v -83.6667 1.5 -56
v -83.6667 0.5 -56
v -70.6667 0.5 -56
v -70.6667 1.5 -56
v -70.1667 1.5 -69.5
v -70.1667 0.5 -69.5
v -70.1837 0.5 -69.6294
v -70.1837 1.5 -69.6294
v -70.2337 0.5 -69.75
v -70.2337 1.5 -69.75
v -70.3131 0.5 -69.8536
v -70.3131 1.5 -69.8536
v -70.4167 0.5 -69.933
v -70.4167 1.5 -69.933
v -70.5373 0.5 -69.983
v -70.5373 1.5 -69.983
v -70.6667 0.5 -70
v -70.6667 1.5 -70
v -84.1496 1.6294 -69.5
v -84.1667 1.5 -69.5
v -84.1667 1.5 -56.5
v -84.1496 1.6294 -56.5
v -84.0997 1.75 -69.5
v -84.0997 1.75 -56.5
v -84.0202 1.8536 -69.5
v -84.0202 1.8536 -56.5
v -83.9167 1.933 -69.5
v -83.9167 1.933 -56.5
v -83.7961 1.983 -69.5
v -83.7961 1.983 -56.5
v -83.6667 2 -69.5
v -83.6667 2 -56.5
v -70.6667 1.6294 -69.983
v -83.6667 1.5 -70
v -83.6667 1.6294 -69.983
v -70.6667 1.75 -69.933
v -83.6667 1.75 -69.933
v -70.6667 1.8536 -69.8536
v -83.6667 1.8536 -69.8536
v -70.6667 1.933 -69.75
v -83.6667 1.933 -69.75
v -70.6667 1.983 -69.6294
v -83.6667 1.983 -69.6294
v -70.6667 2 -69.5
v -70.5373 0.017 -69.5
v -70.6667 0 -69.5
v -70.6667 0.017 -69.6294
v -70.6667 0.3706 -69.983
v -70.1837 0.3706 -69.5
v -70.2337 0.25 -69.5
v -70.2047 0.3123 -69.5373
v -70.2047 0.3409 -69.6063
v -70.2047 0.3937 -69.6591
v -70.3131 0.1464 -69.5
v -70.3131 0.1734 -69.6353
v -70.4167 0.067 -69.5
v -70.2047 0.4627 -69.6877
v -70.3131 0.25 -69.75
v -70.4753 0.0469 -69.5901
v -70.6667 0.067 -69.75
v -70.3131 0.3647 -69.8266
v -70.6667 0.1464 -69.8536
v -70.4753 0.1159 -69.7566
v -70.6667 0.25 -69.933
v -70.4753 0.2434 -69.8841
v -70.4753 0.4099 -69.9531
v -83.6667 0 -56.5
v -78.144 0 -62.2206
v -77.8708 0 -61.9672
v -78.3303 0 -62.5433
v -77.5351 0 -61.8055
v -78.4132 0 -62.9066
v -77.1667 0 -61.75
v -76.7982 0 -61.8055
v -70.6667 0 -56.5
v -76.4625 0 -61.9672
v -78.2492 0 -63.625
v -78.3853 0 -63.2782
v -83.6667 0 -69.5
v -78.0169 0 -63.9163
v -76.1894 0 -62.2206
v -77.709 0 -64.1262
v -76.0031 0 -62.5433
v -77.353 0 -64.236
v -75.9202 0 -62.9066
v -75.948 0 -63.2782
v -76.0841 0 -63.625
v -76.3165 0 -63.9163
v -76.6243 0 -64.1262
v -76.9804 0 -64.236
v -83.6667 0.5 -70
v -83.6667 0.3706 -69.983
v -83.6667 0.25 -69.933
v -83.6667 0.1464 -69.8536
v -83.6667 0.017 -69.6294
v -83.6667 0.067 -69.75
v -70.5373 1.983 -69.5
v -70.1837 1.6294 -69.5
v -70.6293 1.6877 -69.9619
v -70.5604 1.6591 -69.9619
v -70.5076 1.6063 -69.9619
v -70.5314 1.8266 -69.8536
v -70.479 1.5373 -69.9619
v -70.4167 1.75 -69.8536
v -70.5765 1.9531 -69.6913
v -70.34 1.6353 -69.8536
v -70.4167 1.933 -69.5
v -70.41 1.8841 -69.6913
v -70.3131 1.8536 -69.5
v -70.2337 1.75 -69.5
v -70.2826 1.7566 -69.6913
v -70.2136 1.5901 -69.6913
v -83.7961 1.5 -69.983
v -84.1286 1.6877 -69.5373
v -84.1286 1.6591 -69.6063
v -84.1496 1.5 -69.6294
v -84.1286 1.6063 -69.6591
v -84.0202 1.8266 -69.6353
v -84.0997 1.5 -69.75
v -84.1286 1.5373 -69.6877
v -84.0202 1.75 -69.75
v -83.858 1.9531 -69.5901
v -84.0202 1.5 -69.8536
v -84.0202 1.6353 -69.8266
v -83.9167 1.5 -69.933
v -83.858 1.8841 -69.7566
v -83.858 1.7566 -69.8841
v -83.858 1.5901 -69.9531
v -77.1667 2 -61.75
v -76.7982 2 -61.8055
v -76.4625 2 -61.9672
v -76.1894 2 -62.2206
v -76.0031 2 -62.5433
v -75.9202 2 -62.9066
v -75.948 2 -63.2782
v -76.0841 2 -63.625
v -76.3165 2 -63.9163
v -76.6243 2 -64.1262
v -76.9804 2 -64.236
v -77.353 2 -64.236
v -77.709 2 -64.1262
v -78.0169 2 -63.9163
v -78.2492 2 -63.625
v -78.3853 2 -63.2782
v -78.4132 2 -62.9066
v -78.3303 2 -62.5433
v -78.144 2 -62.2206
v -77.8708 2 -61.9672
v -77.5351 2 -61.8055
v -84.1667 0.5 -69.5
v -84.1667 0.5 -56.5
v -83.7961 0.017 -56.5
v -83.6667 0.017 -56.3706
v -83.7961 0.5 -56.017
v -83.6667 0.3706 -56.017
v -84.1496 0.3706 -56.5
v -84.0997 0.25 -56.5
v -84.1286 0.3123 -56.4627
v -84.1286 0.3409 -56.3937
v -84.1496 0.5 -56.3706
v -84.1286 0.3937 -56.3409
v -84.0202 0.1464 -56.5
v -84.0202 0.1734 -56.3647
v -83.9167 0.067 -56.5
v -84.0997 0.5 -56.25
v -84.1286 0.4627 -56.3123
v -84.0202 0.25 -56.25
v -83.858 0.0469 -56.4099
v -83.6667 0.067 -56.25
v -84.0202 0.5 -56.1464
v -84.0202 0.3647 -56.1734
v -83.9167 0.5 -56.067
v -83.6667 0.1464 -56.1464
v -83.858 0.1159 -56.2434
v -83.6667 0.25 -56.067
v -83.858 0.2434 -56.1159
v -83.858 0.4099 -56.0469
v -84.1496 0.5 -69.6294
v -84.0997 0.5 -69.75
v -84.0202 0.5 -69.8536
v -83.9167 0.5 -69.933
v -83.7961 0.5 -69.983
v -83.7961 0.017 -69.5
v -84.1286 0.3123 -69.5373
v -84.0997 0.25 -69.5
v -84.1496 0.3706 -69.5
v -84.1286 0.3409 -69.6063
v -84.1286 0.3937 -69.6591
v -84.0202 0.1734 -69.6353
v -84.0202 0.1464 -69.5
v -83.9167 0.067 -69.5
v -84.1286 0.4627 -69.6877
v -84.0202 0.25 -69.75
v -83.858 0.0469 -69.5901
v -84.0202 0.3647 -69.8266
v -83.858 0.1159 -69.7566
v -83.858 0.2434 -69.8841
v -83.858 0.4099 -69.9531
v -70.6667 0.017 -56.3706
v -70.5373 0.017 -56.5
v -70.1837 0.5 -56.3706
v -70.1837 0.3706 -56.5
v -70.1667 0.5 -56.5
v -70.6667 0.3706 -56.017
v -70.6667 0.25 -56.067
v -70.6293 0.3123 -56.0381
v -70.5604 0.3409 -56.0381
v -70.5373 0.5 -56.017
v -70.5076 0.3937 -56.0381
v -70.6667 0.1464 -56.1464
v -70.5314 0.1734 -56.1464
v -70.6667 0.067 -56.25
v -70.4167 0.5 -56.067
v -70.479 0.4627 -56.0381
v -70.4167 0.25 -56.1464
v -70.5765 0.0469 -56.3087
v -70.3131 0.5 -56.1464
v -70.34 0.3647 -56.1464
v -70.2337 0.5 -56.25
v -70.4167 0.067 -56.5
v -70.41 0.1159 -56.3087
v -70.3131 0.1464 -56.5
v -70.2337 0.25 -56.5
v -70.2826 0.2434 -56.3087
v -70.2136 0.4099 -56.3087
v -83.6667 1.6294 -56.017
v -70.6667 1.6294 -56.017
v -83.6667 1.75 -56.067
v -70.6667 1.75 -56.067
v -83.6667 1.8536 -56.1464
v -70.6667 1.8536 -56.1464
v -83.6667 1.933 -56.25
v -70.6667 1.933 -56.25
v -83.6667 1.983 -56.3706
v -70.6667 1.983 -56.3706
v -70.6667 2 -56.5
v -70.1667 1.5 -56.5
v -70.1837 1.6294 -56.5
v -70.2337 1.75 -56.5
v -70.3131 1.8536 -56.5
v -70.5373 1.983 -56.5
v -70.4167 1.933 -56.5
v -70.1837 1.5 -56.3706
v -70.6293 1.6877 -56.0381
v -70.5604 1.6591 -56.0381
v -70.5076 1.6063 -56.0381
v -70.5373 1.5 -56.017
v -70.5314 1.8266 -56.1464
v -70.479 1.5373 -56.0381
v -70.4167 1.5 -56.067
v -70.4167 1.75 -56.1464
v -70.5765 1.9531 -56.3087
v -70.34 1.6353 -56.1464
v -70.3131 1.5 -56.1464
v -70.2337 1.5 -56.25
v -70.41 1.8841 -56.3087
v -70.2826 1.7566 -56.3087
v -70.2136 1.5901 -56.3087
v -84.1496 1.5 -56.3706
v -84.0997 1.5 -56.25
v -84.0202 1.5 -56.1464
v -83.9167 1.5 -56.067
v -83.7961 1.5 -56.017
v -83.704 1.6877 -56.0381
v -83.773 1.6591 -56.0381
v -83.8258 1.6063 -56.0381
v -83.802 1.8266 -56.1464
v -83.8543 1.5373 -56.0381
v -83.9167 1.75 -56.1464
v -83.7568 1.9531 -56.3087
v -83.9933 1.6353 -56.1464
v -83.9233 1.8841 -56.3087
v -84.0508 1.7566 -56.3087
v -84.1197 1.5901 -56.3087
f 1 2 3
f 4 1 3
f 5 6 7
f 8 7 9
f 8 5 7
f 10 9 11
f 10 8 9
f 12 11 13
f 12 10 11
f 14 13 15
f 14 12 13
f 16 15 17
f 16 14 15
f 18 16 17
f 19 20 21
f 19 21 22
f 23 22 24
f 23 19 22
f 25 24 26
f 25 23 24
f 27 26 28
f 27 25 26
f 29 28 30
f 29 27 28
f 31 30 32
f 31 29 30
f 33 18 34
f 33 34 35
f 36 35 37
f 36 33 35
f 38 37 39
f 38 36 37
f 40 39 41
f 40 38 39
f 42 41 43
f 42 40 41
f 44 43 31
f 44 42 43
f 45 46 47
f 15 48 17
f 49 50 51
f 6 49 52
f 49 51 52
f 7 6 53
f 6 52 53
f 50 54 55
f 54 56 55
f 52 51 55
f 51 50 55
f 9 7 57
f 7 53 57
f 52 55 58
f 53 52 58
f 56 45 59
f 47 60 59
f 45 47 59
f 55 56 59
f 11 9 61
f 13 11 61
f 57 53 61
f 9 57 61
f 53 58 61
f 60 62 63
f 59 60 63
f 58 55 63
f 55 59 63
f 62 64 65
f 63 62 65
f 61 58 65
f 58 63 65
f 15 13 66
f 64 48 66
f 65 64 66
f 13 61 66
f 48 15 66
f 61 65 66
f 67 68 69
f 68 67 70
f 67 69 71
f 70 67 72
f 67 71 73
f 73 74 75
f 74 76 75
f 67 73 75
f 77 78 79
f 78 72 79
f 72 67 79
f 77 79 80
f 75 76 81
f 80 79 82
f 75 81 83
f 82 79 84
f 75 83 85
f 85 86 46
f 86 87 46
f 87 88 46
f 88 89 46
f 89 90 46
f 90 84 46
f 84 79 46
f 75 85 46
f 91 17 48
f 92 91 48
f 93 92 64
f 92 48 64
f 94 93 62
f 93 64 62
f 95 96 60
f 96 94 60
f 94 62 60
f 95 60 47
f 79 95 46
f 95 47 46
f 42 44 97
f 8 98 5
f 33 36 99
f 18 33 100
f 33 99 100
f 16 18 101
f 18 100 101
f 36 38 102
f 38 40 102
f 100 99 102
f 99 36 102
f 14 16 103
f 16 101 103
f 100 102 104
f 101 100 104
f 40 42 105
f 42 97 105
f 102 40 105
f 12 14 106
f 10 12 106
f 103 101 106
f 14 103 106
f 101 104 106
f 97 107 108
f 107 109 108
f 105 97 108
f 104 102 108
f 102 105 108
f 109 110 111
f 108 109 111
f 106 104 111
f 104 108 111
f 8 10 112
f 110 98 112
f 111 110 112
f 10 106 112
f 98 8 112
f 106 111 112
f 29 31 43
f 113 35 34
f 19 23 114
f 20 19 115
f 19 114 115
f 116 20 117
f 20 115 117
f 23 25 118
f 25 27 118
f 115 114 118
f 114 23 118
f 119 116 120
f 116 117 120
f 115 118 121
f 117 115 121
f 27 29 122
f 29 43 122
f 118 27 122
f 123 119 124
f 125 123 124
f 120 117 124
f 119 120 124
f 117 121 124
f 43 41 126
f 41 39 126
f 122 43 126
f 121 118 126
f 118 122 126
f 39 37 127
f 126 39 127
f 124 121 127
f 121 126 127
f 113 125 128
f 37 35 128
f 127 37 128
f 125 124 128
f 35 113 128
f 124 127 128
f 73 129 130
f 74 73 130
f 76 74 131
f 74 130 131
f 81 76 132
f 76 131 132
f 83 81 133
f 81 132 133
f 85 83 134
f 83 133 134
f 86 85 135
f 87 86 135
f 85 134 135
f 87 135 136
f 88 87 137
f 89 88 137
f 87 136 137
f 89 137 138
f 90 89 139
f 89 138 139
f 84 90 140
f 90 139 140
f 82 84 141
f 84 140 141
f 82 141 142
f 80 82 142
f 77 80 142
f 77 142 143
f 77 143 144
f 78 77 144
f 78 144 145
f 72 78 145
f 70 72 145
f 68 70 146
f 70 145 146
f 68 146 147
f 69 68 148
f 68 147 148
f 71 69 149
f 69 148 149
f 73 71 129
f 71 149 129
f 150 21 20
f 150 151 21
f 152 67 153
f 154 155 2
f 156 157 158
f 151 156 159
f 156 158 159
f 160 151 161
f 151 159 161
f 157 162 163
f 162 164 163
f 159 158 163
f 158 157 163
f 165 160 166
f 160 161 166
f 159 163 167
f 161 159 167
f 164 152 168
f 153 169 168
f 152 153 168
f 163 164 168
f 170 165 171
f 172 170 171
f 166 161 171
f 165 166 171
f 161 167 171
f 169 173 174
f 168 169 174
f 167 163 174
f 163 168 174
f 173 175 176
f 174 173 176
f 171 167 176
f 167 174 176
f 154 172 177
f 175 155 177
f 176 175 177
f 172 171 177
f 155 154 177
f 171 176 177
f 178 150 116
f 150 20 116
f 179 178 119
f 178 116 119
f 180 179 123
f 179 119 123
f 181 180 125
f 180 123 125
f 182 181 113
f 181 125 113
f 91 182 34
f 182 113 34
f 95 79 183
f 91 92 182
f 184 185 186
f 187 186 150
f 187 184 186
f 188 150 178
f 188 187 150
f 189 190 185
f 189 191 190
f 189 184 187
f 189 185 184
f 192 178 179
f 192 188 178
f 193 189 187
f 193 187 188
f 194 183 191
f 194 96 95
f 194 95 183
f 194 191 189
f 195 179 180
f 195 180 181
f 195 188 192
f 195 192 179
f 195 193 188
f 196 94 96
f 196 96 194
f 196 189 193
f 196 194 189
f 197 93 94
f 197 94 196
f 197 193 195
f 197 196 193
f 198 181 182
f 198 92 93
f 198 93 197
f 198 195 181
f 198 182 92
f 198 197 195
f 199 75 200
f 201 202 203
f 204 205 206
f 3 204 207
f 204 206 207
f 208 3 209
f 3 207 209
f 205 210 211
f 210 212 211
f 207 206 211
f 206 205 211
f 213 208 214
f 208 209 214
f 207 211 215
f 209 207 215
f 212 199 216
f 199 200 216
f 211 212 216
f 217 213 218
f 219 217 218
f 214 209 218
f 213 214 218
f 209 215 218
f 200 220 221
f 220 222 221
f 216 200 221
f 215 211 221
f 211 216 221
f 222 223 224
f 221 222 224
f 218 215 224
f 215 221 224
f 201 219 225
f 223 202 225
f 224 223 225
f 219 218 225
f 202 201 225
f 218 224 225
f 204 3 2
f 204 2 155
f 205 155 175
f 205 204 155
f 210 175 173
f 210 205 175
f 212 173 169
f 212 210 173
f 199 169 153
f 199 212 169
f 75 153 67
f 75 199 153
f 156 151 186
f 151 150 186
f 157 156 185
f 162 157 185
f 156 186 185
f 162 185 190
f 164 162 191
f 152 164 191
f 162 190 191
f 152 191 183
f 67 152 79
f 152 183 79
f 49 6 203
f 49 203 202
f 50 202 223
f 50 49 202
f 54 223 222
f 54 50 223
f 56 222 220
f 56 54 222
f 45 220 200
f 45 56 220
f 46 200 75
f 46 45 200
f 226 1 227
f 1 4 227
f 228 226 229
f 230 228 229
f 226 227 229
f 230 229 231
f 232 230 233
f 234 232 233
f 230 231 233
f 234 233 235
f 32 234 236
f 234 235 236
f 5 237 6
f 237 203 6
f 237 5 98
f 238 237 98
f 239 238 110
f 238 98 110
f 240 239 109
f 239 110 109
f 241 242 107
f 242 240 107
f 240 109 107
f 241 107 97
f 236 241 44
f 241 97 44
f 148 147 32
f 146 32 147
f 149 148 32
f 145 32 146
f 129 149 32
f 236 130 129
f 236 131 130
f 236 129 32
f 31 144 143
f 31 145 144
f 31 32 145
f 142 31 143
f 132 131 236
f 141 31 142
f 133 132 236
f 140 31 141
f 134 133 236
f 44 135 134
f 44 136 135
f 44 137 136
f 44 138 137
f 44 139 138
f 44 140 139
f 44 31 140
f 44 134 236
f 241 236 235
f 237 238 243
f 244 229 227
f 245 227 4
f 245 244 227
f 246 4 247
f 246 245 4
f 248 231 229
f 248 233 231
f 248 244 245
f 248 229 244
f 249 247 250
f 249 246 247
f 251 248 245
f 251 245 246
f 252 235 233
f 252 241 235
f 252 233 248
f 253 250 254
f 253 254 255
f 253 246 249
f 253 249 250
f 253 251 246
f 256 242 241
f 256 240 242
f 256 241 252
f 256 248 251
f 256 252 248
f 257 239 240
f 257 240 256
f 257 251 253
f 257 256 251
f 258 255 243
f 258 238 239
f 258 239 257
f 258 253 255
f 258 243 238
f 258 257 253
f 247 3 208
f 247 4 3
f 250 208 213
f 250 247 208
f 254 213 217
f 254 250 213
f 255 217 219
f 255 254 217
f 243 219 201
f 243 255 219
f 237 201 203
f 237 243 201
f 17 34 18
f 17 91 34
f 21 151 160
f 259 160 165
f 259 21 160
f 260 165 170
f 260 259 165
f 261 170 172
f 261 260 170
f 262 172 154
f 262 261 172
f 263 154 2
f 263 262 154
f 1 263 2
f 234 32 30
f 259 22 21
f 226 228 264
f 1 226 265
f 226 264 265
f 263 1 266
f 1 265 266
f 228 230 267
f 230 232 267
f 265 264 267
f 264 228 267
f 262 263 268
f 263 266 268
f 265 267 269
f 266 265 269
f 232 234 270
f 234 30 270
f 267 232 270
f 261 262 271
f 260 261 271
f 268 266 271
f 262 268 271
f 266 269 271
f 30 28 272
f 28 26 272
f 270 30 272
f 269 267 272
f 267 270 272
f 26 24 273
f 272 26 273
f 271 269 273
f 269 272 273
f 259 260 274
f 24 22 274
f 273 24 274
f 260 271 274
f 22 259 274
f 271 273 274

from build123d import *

# Parameters (mm, degrees)
SKETCH1_W           = 14
SKETCH1_H           = 14
BOSS_EXTRUDE1_DEPTH = 2
FILLET1_R           = 0.5
SKETCH2_R           = 1.25
CUT_EXTRUDE1_DEPTH  = 2


with BuildPart() as part:
    # Sketch1 → Boss-Extrude1 (new body)
    with BuildSketch(Plane(origin=(0, 0, 0), x_dir=(1, 0, 0), z_dir=(0, 1, 0))):
        with Locations((-77.166666667, 63)):
            Rectangle(SKETCH1_W, SKETCH1_H)
    extrude(amount=BOSS_EXTRUDE1_DEPTH)

    # Fillet1
    fillet1_edges = [part.edges().sort_by_distance(p)[0] for p in [
        (-70.166666667, 2, -63),
        (-77.166666667, 2, -70),
        (-84.166666667, 2, -63),
        (-77.166666667, 0, -70),
        (-70.166666667, 0, -63),
        (-77.166666667, 0, -56),
        (-84.166666667, 0, -63),
        (-77.166666667, 2, -56),
        (-84.166666667, 1, -70),
        (-70.166666667, 1, -70),
        (-70.166666667, 1, -56),
        (-84.166666667, 1, -56),
    ]]
    fillet(fillet1_edges, radius=FILLET1_R)

    # Sketch2 → Cut-Extrude1 (cut)
    with BuildSketch(Plane(origin=(0, 2, 0), x_dir=(1, 0, 0), z_dir=(0, 1, 0))):
        with Locations(Location((-77.166666667, 63, 0), (0, 0, 270))):
            Circle(SKETCH2_R)
    extrude(amount=-CUT_EXTRUDE1_DEPTH, mode=Mode.SUBTRACT)


solid = part.part
